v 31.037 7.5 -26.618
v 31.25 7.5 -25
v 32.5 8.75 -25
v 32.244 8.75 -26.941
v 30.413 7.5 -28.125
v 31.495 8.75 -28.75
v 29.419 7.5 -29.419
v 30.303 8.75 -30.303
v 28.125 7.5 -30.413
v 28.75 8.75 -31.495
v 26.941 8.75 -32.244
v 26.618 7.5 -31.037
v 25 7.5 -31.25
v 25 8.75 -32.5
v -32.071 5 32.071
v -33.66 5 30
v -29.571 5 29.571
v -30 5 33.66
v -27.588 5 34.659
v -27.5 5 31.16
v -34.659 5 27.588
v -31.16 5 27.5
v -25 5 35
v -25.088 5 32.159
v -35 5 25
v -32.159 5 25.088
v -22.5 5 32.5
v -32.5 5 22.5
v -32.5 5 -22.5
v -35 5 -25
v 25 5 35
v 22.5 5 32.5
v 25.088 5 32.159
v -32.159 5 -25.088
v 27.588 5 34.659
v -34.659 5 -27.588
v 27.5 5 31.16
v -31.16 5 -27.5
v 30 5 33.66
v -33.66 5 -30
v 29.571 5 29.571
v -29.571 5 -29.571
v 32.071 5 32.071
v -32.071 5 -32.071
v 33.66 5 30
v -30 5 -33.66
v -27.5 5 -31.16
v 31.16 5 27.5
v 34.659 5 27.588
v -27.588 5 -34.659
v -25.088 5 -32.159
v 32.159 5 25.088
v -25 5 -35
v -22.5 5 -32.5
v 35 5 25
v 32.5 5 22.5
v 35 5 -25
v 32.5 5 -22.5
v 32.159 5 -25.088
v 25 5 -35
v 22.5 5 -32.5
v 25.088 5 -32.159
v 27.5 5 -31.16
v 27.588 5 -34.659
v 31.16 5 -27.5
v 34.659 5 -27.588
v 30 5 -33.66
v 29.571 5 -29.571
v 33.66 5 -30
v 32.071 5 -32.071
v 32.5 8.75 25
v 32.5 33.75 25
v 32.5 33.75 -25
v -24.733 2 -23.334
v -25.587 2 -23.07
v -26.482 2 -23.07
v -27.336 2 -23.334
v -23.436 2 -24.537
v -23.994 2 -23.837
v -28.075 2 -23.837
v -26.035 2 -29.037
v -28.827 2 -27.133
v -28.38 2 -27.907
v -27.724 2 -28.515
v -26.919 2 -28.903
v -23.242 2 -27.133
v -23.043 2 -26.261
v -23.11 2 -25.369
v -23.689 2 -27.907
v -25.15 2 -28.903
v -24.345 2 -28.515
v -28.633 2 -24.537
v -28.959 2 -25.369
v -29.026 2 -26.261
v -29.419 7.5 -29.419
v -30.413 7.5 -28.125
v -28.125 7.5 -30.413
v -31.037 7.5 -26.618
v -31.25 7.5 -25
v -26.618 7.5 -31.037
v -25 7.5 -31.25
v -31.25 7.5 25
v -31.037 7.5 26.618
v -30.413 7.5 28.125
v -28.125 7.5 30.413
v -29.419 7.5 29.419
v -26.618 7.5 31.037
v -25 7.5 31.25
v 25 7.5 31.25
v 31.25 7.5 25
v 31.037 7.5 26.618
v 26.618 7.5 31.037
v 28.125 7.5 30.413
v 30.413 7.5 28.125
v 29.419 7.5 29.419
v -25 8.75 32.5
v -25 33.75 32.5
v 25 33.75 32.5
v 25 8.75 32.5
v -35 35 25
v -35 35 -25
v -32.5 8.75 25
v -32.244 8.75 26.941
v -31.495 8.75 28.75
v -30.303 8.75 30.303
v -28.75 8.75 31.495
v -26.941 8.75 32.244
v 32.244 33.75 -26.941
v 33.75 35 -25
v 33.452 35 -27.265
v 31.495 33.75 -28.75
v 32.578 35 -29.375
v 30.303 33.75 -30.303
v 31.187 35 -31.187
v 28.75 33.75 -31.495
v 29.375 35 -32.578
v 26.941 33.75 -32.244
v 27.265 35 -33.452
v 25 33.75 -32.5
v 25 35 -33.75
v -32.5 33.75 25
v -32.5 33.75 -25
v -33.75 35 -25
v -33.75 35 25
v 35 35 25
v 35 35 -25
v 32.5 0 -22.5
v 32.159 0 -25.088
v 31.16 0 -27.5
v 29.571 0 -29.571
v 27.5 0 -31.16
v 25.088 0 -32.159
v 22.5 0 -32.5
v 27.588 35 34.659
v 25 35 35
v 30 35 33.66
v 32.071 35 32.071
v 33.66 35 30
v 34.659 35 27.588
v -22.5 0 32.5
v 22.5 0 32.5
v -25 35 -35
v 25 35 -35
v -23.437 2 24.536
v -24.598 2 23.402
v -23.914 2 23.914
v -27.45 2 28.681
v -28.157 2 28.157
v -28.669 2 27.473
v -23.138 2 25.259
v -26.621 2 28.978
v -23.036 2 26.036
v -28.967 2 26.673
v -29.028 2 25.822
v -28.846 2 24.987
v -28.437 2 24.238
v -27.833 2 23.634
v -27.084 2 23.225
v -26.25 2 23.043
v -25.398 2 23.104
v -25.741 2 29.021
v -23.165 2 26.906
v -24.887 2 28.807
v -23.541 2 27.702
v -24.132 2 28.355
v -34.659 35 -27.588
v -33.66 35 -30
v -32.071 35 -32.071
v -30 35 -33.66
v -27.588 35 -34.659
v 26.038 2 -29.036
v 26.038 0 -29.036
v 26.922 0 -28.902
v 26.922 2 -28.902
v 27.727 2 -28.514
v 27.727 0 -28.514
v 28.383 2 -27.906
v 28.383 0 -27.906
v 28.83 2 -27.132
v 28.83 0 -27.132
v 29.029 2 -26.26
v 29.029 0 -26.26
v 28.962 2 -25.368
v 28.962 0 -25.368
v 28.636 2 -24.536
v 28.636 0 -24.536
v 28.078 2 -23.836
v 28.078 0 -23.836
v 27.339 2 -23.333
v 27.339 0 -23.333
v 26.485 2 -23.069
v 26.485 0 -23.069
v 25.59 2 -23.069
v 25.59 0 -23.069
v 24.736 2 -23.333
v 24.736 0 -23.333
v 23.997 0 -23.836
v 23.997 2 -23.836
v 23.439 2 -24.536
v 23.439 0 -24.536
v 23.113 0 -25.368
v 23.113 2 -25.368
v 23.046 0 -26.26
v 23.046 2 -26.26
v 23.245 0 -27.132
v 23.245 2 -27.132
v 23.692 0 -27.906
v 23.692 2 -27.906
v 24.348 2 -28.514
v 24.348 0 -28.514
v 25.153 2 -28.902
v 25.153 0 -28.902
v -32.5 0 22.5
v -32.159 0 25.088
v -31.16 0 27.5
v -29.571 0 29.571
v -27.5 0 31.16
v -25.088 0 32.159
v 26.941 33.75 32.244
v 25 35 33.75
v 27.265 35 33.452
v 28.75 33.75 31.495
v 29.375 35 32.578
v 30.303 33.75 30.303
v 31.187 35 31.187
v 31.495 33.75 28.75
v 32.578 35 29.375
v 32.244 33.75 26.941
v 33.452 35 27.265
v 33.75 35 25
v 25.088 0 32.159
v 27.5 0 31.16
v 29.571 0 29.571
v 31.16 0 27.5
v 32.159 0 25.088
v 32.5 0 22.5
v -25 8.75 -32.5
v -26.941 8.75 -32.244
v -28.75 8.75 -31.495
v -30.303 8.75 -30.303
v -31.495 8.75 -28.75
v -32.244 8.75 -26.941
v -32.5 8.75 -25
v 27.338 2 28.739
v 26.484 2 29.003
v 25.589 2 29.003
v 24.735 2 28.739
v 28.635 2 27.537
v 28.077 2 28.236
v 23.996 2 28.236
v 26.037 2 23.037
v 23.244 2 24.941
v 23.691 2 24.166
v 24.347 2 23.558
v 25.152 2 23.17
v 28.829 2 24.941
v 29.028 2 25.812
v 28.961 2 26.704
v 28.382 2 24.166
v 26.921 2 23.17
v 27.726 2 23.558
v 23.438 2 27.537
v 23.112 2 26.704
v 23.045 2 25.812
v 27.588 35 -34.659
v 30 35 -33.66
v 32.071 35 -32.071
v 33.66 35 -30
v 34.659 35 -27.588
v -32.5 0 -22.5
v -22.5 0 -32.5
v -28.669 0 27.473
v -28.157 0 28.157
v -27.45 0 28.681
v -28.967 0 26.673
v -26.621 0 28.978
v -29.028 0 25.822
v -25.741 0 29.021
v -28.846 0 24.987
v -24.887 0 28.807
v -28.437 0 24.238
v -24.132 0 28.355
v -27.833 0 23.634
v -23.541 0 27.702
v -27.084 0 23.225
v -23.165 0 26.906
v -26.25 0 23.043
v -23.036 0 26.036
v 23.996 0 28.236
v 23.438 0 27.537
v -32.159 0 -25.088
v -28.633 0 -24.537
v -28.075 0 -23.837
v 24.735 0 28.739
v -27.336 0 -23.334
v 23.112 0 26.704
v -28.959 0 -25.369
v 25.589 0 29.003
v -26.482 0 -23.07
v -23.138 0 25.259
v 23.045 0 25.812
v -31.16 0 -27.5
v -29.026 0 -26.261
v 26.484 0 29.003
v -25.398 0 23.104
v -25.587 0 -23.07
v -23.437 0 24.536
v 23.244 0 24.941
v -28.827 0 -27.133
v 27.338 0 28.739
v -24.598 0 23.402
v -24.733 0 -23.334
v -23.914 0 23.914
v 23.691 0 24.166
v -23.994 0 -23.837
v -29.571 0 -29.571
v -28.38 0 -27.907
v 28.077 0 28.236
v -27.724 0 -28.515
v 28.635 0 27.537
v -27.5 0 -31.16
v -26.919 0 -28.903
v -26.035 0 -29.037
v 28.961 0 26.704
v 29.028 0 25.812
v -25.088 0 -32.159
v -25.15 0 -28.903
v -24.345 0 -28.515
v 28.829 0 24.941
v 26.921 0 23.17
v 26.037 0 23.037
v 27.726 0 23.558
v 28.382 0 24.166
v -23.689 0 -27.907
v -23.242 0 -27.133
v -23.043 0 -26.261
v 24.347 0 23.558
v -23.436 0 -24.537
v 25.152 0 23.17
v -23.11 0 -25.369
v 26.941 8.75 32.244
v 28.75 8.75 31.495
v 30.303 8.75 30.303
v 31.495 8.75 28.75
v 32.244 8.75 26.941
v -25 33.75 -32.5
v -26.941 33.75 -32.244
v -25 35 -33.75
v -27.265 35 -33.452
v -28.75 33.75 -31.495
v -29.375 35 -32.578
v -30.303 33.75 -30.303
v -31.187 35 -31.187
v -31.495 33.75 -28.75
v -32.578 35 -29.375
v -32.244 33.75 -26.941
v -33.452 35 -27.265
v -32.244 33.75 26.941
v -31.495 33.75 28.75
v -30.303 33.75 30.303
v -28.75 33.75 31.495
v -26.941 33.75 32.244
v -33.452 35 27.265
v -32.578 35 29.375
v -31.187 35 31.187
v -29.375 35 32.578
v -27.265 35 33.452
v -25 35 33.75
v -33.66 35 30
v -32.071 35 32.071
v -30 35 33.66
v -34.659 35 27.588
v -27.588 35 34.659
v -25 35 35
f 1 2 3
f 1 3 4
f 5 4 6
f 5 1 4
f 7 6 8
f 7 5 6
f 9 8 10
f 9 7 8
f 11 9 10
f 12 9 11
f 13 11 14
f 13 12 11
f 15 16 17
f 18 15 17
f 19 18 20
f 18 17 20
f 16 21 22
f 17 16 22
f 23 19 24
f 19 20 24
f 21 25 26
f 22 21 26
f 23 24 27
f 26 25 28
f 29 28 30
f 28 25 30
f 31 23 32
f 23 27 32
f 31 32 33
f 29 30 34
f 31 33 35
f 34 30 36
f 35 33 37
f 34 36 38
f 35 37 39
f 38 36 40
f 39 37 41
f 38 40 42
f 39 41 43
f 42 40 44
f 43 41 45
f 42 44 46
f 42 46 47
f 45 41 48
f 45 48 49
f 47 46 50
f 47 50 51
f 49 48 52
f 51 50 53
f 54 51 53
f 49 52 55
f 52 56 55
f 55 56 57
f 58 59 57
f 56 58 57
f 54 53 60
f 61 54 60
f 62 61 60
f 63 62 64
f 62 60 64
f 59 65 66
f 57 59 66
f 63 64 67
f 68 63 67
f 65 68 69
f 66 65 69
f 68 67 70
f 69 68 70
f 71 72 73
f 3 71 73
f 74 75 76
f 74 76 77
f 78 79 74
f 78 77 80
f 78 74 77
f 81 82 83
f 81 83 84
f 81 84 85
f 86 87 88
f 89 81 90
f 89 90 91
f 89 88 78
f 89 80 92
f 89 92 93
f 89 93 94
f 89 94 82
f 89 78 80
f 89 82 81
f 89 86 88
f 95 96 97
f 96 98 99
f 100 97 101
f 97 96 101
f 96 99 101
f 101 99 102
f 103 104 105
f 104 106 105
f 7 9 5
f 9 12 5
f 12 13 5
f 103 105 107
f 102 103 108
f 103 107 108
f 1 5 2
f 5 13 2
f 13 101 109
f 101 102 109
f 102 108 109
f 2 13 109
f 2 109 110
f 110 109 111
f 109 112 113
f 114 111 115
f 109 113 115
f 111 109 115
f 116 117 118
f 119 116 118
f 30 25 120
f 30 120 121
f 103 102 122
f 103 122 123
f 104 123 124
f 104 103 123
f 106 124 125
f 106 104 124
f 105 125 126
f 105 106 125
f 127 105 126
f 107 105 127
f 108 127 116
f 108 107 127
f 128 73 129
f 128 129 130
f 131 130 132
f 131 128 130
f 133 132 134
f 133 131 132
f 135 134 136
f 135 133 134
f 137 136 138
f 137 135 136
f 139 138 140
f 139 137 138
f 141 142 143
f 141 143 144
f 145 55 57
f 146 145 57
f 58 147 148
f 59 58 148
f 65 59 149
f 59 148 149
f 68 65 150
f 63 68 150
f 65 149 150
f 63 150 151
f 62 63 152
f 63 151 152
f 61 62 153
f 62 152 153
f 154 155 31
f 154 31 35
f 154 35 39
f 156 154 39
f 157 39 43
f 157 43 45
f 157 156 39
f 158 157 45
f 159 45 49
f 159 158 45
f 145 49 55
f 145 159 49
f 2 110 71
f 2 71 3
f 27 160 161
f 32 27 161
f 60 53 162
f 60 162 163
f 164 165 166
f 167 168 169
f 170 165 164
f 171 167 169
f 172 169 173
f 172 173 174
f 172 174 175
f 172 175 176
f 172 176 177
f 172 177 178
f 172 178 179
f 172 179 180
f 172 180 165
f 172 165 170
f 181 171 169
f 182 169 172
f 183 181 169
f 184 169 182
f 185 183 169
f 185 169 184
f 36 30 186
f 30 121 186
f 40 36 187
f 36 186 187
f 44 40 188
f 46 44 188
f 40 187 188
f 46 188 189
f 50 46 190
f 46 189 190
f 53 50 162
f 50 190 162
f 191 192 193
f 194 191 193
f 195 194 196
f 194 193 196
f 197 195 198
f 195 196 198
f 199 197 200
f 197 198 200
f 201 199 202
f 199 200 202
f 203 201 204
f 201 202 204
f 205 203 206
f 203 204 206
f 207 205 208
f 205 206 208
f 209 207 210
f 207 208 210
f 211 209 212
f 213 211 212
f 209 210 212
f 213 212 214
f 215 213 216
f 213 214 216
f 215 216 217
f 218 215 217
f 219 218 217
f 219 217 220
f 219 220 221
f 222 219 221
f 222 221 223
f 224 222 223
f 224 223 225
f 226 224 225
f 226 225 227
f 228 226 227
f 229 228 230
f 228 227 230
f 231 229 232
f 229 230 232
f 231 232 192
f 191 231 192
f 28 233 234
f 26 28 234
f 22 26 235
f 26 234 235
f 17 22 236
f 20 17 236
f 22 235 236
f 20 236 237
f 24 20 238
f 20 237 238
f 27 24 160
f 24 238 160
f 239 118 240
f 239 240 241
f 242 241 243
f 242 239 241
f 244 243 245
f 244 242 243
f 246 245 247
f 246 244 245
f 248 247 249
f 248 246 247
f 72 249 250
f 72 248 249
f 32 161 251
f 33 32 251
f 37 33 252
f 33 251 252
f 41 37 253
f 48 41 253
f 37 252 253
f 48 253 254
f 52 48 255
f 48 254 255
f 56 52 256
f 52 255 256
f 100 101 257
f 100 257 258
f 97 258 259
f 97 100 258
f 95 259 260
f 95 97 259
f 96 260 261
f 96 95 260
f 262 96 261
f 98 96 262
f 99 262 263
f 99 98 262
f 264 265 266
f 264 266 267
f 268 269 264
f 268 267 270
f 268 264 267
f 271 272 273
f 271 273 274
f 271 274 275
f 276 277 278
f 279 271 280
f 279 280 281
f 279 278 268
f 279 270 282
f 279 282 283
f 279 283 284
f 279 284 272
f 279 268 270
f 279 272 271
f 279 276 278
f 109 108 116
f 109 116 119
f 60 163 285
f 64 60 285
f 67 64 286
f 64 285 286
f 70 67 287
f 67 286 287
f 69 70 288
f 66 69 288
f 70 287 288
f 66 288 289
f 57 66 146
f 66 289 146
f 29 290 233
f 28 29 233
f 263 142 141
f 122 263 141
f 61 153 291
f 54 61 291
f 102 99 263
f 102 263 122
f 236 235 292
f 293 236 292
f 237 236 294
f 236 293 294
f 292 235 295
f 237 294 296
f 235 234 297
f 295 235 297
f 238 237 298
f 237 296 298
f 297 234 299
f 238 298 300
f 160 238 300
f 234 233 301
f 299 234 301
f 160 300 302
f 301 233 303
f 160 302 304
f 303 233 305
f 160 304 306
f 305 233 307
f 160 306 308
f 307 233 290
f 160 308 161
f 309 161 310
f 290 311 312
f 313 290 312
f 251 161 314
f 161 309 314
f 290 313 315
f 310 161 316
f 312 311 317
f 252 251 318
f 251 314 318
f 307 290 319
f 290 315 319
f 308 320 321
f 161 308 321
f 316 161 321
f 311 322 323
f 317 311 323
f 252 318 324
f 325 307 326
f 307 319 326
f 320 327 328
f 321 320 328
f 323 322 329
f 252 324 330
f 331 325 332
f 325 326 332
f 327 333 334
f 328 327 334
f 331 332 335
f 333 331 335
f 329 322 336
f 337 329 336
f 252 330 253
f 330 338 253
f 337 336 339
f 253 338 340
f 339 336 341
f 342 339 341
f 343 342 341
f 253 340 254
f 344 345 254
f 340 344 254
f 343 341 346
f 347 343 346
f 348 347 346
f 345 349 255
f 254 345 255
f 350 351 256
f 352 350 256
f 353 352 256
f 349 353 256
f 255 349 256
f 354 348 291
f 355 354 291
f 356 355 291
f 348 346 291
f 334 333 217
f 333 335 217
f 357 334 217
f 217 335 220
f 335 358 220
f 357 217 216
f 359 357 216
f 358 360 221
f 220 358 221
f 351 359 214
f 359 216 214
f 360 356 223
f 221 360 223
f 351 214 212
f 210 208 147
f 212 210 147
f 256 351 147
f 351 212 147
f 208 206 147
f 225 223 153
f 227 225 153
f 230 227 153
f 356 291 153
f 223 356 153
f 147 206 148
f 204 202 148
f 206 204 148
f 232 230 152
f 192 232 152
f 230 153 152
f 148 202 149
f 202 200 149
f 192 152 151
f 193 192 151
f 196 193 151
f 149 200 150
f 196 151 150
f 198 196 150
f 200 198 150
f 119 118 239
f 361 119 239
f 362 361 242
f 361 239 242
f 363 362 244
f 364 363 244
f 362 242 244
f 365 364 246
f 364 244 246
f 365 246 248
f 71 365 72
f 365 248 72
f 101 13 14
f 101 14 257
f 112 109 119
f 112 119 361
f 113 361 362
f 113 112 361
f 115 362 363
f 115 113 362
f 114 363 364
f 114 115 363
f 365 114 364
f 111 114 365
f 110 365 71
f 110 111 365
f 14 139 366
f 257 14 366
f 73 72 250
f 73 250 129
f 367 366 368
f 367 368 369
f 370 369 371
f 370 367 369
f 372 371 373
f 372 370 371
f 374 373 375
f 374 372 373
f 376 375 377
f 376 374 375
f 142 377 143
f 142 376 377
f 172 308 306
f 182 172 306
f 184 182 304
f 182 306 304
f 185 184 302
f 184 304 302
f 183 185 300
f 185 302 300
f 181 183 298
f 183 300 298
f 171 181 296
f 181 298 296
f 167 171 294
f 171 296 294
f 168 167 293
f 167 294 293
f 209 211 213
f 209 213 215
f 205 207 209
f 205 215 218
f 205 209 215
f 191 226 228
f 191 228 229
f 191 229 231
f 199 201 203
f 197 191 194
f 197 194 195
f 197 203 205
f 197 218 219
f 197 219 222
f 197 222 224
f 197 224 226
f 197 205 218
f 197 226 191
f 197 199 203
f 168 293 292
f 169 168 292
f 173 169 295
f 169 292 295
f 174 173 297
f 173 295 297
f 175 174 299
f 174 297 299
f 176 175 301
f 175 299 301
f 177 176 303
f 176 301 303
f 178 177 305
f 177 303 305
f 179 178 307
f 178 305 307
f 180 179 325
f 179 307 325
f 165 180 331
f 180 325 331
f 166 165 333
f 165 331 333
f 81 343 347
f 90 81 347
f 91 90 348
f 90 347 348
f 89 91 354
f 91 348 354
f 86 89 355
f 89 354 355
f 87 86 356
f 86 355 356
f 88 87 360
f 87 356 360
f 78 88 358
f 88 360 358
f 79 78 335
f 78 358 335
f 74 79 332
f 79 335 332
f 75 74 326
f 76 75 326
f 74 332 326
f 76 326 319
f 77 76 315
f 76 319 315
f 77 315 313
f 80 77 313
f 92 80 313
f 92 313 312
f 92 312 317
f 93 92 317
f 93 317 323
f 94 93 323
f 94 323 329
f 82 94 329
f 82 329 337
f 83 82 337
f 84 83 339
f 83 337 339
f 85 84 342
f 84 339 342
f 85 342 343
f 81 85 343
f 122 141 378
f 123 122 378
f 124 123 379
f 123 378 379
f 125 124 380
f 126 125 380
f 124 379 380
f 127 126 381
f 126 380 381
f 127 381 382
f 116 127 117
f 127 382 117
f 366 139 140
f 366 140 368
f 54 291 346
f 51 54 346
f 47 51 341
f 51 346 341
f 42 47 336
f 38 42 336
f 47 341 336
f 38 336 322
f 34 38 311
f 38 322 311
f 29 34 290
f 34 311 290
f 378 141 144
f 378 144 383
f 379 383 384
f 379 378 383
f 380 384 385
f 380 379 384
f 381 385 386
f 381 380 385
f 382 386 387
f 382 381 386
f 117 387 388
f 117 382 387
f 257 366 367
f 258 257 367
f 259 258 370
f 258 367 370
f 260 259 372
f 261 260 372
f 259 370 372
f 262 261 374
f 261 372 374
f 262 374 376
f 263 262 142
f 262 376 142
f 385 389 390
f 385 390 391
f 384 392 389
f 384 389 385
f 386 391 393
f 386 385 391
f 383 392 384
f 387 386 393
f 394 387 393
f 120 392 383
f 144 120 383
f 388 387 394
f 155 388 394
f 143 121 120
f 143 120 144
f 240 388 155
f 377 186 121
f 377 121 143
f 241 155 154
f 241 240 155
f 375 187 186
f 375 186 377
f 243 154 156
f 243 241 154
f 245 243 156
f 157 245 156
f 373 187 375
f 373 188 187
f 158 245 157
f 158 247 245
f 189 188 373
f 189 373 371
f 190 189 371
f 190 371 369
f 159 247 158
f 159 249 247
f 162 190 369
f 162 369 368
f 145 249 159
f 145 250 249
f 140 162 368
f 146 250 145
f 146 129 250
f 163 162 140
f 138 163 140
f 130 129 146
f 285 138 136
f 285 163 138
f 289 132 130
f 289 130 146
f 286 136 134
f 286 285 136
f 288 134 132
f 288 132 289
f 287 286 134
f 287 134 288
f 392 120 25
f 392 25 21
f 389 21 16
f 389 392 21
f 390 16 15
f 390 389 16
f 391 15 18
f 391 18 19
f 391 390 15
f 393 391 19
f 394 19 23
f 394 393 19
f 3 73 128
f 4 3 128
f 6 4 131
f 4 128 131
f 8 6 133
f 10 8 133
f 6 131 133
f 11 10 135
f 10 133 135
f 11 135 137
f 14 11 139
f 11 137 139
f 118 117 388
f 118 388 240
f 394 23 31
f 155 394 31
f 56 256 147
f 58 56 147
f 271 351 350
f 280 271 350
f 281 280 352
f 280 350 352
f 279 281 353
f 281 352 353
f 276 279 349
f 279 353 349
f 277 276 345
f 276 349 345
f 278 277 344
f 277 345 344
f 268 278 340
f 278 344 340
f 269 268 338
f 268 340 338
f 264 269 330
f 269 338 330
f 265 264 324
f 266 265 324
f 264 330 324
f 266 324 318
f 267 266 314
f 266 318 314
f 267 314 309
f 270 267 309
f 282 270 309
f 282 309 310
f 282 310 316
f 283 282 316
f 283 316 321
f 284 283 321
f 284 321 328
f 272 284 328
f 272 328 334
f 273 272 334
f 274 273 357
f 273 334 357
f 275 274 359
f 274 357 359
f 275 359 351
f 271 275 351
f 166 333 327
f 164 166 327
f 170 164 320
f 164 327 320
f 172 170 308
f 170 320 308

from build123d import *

# Parameters (mm, degrees)
BOSS_EXTRUDE4_DEPTH = 5
SKETCH6_W           = 70
SKETCH6_H           = 70
BOSS_EXTRUDE5_DEPTH = 30
SKETCH8_R           = 3
CUT_EXTRUDE1_DEPTH  = 2
FILLET1_R           = 10
CUT_EXTRUDE2_DEPTH  = 30
BOSS_EXTRUDE6_DEPTH = 2.5
CHAMFER1_SIZE       = 1.25


with BuildPart() as part:
    # Sketch5 → Boss-Extrude4 (new body)
    with BuildSketch(Plane(origin=(0, 0, 0), x_dir=(1, 0, 0), z_dir=(0, 1, 0))):
        with BuildLine():
            Line((-22.5, -32.5), (22.5, -32.5))
            ThreePointArc((22.5, -32.5), (29.571067812, -29.571067812), (32.5, -22.5))
            Line((32.5, -22.5), (32.5, 22.5))
            ThreePointArc((32.5, 22.5), (29.571067812, 29.571067812), (22.5, 32.5))
            Line((22.5, 32.5), (-22.5, 32.5))
            ThreePointArc((-22.5, 32.5), (-29.571067812, 29.571067812), (-32.5, 22.5))
            Line((-32.5, 22.5), (-32.5, -22.5))
            ThreePointArc((-32.5, -22.5), (-29.571067812, -29.571067812), (-22.5, -32.5))
        make_face()
    extrude(amount=BOSS_EXTRUDE4_DEPTH)

    # Sketch6 → Boss-Extrude5 (add)
    with BuildSketch(Plane(origin=(0, 5, 0), x_dir=(1, 0, 0), z_dir=(0, 1, 0))):
        Rectangle(SKETCH6_W, SKETCH6_H)
    extrude(amount=BOSS_EXTRUDE5_DEPTH)

    # Sketch8 → Cut-Extrude1 (cut)
    with BuildSketch(Plane.XZ):
        with Locations(Location((26.037533906, -26.035533906, 0), (0, 0, 270))):
            Circle(SKETCH8_R)
        with Locations(Location((26.036533906, 26.036533906, 0), (0, 0, 270))):
            Circle(SKETCH8_R)
        with BuildLine():
            ThreePointArc((-23.035533906, 26.035533906), (-24.887483609, 28.807172503), (-28.156854249, 28.156854249))
            Line((-28.156854249, 28.156854249), (-23.914213562, 23.914213562))
            ThreePointArc((-23.914213562, 23.914213562), (-23.263895308, 24.887483609), (-23.035533906, 26.035533906))
        make_face()
        with BuildLine():
            Line((-23.914213562, 23.914213562), (-28.156854249, 28.156854249))
            ThreePointArc((-28.156854249, 28.156854249), (-28.156854249, 23.914213562), (-23.914213562, 23.914213562))
        make_face()
        with Locations(Location((-26.034533906, -26.036533906, 0), (0, 0, 270))):
            Circle(SKETCH8_R)
    extrude(amount=-CUT_EXTRUDE1_DEPTH, mode=Mode.SUBTRACT)

    # Fillet1
    fillet1_edges = [part.edges().sort_by_distance(p)[0] for p in [
        (-35, 20, -35),
        (-35, 20, 35),
        (35, 20, 35),
        (35, 20, -35),
    ]]
    fillet(fillet1_edges, radius=FILLET1_R)

    # Sketch9 → Cut-Extrude2 (cut)
    with BuildSketch(Plane(origin=(0, 35, 0), x_dir=(1, 0, 0), z_dir=(0, 1, 0))):
        with BuildLine():
            Line((25, 32.5), (-25, 32.5))
            ThreePointArc((-25, 32.5), (-30.303300859, 30.303300859), (-32.5, 25))
            Line((-32.5, 25), (-32.5, -25))
            ThreePointArc((-32.5, -25), (-30.303300859, -30.303300859), (-25, -32.5))
            Line((-25, -32.5), (25, -32.5))
            ThreePointArc((25, -32.5), (30.303300859, -30.303300859), (32.5, -25))
            Line((32.5, -25), (32.5, 25))
            ThreePointArc((32.5, 25), (30.303300859, 30.303300859), (25, 32.5))
        make_face()
    extrude(amount=-CUT_EXTRUDE2_DEPTH, mode=Mode.SUBTRACT)


with BuildPart() as cut_extrude2_piece_1:
    # of the separate pieces the step leaves, piece 1, a body of its own (cut_extrude2_pieces)
    add(part.part.solids().sort_by_distance((-22.5, 0, 32.5))[0])



with BuildPart() as cut_extrude2_piece_2:
    # of the separate pieces the step leaves, piece 2, a body of its own (cut_extrude2_pieces)
    add(part.part.solids().sort_by_distance((25, 5, -35))[0])


with BuildPart() as cut_extrude2_piece_1_1:
    add(cut_extrude2_piece_1.part)

    add(cut_extrude2_piece_2.part)  # Boss-Extrude6 merges Cut-Extrude2 piece 2
    # Sketch10 → Boss-Extrude6 (add)
    with BuildSketch(Plane.XZ.offset(-5)):
        with BuildLine():
            Line((-35, 25), (-35, -25))
            ThreePointArc((-35, -25), (-32.071067812, -32.071067812), (-25, -35))
            Line((-25, -35), (25, -35))
            ThreePointArc((25, -35), (32.071067812, -32.071067812), (35, -25))
            Line((35, -25), (35, 25))
            ThreePointArc((35, 25), (32.071067812, 32.071067812), (25, 35))
            Line((25, 35), (-25, 35))
            ThreePointArc((-25, 35), (-32.071067812, 32.071067812), (-35, 25))
        make_face()
    extrude(amount=-BOSS_EXTRUDE6_DEPTH)

    # Chamfer1
    chamfer1_edges = [cut_extrude2_piece_1_1.edges().sort_by_distance(p)[0] for p in [
        (0, 35, -32.5),
        (-30.303300859, 35, -30.303300859),
        (-32.5, 35, 0),
        (-30.303300859, 35, 30.303300859),
        (0, 35, 32.5),
        (30.303300859, 35, 30.303300859),
        (32.5, 35, 0),
        (30.303300859, 7.5, -30.303300859),
        (0, 7.5, -32.5),
        (-30.303300859, 7.5, -30.303300859),
        (-32.5, 7.5, 0),
        (-30.303300859, 7.5, 30.303300859),
        (0, 7.5, 32.5),
        (30.303300859, 7.5, 30.303300859),
        (32.5, 7.5, 0),
        (30.303300859, 35, -30.303300859),
    ]]
    chamfer(chamfer1_edges, length=CHAMFER1_SIZE)


solid = cut_extrude2_piece_1_1.part
